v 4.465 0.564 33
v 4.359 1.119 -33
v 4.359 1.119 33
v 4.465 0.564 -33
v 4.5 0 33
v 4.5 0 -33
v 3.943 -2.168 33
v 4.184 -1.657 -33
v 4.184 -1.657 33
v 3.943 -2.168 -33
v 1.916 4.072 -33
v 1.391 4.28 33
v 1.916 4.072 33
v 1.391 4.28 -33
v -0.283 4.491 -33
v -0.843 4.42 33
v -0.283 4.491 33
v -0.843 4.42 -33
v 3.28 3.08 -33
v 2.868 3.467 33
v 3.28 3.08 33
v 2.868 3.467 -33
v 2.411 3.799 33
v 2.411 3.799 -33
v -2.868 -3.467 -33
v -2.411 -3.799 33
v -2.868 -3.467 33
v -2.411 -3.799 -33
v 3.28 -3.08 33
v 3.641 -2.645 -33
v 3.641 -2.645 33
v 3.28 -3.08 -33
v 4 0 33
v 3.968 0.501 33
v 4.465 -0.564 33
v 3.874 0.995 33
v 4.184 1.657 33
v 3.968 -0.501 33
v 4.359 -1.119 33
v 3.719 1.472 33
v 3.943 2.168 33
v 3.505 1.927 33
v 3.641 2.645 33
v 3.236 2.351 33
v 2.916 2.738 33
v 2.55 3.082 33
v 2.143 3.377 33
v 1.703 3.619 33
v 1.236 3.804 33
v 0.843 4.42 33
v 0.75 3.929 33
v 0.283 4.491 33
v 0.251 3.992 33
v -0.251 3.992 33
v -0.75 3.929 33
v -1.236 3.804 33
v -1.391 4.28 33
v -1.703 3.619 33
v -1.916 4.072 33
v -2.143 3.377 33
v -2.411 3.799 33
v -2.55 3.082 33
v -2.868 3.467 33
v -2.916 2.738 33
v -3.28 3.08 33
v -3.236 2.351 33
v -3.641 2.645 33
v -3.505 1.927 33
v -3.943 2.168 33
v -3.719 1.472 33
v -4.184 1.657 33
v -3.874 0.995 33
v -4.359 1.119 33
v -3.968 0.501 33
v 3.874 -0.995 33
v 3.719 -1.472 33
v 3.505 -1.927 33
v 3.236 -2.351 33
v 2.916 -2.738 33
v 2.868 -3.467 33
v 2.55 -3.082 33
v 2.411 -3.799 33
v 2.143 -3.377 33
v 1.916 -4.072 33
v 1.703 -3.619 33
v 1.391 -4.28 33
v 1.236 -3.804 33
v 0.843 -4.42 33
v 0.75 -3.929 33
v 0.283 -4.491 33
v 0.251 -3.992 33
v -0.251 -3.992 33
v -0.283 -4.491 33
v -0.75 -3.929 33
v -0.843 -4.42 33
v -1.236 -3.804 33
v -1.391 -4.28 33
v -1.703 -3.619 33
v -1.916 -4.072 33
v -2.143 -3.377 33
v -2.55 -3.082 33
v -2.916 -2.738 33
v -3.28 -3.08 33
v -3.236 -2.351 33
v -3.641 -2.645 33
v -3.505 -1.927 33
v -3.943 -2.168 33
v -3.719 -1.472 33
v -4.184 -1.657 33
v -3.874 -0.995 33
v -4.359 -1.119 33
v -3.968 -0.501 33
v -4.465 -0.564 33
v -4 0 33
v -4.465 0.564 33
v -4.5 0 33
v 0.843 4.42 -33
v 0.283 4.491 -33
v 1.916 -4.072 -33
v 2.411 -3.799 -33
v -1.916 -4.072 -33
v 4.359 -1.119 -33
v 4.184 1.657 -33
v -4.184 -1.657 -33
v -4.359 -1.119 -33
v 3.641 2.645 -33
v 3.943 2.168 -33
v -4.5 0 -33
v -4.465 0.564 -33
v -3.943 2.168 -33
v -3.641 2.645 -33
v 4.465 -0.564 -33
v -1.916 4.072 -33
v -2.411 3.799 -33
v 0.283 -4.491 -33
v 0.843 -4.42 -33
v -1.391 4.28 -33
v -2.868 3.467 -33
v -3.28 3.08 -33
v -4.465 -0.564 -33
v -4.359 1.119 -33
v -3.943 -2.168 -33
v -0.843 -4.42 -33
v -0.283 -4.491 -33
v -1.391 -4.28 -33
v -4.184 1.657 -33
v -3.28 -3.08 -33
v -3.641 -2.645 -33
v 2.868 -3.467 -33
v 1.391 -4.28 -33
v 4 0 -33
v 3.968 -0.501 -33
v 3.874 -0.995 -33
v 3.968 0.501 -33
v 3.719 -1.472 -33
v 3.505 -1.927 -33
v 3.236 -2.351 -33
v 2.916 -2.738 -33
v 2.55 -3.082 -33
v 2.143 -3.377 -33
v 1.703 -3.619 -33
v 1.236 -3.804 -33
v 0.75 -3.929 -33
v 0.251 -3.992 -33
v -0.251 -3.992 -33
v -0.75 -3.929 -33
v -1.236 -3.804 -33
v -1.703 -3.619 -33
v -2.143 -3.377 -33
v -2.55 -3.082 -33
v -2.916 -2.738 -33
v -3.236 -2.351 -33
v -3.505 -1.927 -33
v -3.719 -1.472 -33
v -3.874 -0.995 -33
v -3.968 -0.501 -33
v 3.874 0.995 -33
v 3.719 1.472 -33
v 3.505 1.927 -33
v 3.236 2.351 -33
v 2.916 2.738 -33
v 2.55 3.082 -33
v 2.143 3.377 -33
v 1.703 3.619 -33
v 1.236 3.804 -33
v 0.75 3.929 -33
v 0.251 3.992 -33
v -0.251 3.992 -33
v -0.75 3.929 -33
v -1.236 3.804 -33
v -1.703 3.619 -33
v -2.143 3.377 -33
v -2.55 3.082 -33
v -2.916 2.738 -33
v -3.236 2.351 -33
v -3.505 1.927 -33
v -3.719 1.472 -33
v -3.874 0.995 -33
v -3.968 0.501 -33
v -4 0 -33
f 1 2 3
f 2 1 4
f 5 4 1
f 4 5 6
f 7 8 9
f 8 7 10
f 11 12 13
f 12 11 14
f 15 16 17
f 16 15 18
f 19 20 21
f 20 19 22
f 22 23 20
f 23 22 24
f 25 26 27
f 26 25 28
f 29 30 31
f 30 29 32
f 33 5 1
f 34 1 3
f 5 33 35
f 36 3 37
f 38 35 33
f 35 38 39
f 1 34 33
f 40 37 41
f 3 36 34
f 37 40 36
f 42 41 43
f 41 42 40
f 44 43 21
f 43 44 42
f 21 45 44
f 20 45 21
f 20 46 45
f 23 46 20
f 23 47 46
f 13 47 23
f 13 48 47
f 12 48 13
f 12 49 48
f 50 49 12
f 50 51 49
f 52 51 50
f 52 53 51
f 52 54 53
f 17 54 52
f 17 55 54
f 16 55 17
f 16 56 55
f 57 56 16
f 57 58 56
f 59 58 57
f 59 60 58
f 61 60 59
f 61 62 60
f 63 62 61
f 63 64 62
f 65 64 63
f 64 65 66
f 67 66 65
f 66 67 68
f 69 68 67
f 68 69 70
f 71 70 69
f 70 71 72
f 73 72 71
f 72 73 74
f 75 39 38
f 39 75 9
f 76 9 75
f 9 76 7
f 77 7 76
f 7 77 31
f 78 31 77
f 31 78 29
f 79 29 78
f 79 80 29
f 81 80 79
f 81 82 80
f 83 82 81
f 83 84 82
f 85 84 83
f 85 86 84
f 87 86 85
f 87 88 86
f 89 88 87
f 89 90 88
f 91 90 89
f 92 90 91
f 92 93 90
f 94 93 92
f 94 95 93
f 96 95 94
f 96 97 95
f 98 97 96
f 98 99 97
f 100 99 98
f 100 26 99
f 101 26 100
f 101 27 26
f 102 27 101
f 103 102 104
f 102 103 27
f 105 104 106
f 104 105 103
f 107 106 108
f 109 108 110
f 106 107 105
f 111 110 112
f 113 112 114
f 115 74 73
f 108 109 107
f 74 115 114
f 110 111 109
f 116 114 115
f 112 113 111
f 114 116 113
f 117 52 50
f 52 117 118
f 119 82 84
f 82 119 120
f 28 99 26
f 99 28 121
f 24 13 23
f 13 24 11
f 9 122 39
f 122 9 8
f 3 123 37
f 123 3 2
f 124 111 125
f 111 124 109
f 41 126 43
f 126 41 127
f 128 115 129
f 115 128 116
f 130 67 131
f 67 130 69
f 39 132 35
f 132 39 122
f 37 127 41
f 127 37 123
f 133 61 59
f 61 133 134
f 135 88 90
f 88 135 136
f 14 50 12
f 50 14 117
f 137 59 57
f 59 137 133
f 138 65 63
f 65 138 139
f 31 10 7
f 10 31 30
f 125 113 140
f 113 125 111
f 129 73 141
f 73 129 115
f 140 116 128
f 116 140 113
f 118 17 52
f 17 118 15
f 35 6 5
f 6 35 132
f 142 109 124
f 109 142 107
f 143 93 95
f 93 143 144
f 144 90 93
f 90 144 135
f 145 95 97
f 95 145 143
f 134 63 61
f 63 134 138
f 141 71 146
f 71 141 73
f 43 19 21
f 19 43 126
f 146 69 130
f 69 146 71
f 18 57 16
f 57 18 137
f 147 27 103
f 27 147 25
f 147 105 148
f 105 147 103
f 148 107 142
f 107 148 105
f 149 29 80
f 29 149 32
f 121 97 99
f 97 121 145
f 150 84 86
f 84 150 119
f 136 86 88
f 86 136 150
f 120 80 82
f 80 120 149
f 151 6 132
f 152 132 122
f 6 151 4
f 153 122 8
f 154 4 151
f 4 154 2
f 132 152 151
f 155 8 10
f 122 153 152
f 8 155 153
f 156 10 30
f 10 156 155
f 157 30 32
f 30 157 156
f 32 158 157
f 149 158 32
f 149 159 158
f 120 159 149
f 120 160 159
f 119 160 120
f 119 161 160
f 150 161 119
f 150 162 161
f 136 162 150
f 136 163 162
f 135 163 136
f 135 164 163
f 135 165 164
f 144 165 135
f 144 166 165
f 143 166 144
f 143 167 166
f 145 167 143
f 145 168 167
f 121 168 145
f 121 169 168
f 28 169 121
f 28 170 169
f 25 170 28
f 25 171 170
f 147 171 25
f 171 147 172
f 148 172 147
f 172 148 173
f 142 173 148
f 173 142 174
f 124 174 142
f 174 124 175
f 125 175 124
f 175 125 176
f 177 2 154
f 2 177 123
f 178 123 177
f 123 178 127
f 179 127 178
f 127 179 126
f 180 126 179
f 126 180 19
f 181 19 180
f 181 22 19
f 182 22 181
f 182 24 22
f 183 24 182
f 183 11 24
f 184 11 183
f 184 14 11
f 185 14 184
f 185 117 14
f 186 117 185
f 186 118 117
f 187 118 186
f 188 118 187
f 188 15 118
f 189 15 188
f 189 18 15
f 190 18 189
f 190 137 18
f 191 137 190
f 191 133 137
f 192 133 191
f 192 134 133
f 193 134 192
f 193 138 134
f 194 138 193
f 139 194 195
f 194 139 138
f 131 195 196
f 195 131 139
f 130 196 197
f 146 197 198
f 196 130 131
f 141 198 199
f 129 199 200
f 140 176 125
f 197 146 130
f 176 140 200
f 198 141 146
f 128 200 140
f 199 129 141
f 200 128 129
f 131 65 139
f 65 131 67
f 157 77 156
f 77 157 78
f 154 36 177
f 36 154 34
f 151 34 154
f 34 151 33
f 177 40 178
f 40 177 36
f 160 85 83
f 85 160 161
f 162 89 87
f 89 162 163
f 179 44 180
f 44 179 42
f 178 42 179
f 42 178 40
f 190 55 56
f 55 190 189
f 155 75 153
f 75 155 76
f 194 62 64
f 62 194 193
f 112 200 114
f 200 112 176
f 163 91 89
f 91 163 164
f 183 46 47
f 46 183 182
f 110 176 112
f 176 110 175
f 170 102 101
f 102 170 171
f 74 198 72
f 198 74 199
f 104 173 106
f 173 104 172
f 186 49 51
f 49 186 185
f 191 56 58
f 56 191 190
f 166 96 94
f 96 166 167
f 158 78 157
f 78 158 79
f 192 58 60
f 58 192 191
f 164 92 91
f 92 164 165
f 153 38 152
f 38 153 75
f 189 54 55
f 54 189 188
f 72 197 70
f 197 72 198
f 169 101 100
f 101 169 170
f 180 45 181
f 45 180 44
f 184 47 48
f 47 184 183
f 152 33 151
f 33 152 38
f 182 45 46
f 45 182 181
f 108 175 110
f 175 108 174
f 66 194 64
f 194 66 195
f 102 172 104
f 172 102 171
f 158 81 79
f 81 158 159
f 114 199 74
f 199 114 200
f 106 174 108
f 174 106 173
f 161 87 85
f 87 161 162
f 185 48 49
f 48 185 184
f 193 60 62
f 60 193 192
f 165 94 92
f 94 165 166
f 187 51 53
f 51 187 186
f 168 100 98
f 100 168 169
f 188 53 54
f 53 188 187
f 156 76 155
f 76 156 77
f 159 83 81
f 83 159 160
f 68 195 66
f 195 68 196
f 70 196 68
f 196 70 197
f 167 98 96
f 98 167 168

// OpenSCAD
$fn = 50;


difference() {
	union() {
		translate(v = [0, 0, -33.0000000000]) {
			cylinder(h = 66, r = 4.5000000000);
		}
	}
	union() {
		translate(v = [0, 0, -100.0000000000]) {
			cylinder(h = 200, r = 4.0000000000);
		}
	}
}
